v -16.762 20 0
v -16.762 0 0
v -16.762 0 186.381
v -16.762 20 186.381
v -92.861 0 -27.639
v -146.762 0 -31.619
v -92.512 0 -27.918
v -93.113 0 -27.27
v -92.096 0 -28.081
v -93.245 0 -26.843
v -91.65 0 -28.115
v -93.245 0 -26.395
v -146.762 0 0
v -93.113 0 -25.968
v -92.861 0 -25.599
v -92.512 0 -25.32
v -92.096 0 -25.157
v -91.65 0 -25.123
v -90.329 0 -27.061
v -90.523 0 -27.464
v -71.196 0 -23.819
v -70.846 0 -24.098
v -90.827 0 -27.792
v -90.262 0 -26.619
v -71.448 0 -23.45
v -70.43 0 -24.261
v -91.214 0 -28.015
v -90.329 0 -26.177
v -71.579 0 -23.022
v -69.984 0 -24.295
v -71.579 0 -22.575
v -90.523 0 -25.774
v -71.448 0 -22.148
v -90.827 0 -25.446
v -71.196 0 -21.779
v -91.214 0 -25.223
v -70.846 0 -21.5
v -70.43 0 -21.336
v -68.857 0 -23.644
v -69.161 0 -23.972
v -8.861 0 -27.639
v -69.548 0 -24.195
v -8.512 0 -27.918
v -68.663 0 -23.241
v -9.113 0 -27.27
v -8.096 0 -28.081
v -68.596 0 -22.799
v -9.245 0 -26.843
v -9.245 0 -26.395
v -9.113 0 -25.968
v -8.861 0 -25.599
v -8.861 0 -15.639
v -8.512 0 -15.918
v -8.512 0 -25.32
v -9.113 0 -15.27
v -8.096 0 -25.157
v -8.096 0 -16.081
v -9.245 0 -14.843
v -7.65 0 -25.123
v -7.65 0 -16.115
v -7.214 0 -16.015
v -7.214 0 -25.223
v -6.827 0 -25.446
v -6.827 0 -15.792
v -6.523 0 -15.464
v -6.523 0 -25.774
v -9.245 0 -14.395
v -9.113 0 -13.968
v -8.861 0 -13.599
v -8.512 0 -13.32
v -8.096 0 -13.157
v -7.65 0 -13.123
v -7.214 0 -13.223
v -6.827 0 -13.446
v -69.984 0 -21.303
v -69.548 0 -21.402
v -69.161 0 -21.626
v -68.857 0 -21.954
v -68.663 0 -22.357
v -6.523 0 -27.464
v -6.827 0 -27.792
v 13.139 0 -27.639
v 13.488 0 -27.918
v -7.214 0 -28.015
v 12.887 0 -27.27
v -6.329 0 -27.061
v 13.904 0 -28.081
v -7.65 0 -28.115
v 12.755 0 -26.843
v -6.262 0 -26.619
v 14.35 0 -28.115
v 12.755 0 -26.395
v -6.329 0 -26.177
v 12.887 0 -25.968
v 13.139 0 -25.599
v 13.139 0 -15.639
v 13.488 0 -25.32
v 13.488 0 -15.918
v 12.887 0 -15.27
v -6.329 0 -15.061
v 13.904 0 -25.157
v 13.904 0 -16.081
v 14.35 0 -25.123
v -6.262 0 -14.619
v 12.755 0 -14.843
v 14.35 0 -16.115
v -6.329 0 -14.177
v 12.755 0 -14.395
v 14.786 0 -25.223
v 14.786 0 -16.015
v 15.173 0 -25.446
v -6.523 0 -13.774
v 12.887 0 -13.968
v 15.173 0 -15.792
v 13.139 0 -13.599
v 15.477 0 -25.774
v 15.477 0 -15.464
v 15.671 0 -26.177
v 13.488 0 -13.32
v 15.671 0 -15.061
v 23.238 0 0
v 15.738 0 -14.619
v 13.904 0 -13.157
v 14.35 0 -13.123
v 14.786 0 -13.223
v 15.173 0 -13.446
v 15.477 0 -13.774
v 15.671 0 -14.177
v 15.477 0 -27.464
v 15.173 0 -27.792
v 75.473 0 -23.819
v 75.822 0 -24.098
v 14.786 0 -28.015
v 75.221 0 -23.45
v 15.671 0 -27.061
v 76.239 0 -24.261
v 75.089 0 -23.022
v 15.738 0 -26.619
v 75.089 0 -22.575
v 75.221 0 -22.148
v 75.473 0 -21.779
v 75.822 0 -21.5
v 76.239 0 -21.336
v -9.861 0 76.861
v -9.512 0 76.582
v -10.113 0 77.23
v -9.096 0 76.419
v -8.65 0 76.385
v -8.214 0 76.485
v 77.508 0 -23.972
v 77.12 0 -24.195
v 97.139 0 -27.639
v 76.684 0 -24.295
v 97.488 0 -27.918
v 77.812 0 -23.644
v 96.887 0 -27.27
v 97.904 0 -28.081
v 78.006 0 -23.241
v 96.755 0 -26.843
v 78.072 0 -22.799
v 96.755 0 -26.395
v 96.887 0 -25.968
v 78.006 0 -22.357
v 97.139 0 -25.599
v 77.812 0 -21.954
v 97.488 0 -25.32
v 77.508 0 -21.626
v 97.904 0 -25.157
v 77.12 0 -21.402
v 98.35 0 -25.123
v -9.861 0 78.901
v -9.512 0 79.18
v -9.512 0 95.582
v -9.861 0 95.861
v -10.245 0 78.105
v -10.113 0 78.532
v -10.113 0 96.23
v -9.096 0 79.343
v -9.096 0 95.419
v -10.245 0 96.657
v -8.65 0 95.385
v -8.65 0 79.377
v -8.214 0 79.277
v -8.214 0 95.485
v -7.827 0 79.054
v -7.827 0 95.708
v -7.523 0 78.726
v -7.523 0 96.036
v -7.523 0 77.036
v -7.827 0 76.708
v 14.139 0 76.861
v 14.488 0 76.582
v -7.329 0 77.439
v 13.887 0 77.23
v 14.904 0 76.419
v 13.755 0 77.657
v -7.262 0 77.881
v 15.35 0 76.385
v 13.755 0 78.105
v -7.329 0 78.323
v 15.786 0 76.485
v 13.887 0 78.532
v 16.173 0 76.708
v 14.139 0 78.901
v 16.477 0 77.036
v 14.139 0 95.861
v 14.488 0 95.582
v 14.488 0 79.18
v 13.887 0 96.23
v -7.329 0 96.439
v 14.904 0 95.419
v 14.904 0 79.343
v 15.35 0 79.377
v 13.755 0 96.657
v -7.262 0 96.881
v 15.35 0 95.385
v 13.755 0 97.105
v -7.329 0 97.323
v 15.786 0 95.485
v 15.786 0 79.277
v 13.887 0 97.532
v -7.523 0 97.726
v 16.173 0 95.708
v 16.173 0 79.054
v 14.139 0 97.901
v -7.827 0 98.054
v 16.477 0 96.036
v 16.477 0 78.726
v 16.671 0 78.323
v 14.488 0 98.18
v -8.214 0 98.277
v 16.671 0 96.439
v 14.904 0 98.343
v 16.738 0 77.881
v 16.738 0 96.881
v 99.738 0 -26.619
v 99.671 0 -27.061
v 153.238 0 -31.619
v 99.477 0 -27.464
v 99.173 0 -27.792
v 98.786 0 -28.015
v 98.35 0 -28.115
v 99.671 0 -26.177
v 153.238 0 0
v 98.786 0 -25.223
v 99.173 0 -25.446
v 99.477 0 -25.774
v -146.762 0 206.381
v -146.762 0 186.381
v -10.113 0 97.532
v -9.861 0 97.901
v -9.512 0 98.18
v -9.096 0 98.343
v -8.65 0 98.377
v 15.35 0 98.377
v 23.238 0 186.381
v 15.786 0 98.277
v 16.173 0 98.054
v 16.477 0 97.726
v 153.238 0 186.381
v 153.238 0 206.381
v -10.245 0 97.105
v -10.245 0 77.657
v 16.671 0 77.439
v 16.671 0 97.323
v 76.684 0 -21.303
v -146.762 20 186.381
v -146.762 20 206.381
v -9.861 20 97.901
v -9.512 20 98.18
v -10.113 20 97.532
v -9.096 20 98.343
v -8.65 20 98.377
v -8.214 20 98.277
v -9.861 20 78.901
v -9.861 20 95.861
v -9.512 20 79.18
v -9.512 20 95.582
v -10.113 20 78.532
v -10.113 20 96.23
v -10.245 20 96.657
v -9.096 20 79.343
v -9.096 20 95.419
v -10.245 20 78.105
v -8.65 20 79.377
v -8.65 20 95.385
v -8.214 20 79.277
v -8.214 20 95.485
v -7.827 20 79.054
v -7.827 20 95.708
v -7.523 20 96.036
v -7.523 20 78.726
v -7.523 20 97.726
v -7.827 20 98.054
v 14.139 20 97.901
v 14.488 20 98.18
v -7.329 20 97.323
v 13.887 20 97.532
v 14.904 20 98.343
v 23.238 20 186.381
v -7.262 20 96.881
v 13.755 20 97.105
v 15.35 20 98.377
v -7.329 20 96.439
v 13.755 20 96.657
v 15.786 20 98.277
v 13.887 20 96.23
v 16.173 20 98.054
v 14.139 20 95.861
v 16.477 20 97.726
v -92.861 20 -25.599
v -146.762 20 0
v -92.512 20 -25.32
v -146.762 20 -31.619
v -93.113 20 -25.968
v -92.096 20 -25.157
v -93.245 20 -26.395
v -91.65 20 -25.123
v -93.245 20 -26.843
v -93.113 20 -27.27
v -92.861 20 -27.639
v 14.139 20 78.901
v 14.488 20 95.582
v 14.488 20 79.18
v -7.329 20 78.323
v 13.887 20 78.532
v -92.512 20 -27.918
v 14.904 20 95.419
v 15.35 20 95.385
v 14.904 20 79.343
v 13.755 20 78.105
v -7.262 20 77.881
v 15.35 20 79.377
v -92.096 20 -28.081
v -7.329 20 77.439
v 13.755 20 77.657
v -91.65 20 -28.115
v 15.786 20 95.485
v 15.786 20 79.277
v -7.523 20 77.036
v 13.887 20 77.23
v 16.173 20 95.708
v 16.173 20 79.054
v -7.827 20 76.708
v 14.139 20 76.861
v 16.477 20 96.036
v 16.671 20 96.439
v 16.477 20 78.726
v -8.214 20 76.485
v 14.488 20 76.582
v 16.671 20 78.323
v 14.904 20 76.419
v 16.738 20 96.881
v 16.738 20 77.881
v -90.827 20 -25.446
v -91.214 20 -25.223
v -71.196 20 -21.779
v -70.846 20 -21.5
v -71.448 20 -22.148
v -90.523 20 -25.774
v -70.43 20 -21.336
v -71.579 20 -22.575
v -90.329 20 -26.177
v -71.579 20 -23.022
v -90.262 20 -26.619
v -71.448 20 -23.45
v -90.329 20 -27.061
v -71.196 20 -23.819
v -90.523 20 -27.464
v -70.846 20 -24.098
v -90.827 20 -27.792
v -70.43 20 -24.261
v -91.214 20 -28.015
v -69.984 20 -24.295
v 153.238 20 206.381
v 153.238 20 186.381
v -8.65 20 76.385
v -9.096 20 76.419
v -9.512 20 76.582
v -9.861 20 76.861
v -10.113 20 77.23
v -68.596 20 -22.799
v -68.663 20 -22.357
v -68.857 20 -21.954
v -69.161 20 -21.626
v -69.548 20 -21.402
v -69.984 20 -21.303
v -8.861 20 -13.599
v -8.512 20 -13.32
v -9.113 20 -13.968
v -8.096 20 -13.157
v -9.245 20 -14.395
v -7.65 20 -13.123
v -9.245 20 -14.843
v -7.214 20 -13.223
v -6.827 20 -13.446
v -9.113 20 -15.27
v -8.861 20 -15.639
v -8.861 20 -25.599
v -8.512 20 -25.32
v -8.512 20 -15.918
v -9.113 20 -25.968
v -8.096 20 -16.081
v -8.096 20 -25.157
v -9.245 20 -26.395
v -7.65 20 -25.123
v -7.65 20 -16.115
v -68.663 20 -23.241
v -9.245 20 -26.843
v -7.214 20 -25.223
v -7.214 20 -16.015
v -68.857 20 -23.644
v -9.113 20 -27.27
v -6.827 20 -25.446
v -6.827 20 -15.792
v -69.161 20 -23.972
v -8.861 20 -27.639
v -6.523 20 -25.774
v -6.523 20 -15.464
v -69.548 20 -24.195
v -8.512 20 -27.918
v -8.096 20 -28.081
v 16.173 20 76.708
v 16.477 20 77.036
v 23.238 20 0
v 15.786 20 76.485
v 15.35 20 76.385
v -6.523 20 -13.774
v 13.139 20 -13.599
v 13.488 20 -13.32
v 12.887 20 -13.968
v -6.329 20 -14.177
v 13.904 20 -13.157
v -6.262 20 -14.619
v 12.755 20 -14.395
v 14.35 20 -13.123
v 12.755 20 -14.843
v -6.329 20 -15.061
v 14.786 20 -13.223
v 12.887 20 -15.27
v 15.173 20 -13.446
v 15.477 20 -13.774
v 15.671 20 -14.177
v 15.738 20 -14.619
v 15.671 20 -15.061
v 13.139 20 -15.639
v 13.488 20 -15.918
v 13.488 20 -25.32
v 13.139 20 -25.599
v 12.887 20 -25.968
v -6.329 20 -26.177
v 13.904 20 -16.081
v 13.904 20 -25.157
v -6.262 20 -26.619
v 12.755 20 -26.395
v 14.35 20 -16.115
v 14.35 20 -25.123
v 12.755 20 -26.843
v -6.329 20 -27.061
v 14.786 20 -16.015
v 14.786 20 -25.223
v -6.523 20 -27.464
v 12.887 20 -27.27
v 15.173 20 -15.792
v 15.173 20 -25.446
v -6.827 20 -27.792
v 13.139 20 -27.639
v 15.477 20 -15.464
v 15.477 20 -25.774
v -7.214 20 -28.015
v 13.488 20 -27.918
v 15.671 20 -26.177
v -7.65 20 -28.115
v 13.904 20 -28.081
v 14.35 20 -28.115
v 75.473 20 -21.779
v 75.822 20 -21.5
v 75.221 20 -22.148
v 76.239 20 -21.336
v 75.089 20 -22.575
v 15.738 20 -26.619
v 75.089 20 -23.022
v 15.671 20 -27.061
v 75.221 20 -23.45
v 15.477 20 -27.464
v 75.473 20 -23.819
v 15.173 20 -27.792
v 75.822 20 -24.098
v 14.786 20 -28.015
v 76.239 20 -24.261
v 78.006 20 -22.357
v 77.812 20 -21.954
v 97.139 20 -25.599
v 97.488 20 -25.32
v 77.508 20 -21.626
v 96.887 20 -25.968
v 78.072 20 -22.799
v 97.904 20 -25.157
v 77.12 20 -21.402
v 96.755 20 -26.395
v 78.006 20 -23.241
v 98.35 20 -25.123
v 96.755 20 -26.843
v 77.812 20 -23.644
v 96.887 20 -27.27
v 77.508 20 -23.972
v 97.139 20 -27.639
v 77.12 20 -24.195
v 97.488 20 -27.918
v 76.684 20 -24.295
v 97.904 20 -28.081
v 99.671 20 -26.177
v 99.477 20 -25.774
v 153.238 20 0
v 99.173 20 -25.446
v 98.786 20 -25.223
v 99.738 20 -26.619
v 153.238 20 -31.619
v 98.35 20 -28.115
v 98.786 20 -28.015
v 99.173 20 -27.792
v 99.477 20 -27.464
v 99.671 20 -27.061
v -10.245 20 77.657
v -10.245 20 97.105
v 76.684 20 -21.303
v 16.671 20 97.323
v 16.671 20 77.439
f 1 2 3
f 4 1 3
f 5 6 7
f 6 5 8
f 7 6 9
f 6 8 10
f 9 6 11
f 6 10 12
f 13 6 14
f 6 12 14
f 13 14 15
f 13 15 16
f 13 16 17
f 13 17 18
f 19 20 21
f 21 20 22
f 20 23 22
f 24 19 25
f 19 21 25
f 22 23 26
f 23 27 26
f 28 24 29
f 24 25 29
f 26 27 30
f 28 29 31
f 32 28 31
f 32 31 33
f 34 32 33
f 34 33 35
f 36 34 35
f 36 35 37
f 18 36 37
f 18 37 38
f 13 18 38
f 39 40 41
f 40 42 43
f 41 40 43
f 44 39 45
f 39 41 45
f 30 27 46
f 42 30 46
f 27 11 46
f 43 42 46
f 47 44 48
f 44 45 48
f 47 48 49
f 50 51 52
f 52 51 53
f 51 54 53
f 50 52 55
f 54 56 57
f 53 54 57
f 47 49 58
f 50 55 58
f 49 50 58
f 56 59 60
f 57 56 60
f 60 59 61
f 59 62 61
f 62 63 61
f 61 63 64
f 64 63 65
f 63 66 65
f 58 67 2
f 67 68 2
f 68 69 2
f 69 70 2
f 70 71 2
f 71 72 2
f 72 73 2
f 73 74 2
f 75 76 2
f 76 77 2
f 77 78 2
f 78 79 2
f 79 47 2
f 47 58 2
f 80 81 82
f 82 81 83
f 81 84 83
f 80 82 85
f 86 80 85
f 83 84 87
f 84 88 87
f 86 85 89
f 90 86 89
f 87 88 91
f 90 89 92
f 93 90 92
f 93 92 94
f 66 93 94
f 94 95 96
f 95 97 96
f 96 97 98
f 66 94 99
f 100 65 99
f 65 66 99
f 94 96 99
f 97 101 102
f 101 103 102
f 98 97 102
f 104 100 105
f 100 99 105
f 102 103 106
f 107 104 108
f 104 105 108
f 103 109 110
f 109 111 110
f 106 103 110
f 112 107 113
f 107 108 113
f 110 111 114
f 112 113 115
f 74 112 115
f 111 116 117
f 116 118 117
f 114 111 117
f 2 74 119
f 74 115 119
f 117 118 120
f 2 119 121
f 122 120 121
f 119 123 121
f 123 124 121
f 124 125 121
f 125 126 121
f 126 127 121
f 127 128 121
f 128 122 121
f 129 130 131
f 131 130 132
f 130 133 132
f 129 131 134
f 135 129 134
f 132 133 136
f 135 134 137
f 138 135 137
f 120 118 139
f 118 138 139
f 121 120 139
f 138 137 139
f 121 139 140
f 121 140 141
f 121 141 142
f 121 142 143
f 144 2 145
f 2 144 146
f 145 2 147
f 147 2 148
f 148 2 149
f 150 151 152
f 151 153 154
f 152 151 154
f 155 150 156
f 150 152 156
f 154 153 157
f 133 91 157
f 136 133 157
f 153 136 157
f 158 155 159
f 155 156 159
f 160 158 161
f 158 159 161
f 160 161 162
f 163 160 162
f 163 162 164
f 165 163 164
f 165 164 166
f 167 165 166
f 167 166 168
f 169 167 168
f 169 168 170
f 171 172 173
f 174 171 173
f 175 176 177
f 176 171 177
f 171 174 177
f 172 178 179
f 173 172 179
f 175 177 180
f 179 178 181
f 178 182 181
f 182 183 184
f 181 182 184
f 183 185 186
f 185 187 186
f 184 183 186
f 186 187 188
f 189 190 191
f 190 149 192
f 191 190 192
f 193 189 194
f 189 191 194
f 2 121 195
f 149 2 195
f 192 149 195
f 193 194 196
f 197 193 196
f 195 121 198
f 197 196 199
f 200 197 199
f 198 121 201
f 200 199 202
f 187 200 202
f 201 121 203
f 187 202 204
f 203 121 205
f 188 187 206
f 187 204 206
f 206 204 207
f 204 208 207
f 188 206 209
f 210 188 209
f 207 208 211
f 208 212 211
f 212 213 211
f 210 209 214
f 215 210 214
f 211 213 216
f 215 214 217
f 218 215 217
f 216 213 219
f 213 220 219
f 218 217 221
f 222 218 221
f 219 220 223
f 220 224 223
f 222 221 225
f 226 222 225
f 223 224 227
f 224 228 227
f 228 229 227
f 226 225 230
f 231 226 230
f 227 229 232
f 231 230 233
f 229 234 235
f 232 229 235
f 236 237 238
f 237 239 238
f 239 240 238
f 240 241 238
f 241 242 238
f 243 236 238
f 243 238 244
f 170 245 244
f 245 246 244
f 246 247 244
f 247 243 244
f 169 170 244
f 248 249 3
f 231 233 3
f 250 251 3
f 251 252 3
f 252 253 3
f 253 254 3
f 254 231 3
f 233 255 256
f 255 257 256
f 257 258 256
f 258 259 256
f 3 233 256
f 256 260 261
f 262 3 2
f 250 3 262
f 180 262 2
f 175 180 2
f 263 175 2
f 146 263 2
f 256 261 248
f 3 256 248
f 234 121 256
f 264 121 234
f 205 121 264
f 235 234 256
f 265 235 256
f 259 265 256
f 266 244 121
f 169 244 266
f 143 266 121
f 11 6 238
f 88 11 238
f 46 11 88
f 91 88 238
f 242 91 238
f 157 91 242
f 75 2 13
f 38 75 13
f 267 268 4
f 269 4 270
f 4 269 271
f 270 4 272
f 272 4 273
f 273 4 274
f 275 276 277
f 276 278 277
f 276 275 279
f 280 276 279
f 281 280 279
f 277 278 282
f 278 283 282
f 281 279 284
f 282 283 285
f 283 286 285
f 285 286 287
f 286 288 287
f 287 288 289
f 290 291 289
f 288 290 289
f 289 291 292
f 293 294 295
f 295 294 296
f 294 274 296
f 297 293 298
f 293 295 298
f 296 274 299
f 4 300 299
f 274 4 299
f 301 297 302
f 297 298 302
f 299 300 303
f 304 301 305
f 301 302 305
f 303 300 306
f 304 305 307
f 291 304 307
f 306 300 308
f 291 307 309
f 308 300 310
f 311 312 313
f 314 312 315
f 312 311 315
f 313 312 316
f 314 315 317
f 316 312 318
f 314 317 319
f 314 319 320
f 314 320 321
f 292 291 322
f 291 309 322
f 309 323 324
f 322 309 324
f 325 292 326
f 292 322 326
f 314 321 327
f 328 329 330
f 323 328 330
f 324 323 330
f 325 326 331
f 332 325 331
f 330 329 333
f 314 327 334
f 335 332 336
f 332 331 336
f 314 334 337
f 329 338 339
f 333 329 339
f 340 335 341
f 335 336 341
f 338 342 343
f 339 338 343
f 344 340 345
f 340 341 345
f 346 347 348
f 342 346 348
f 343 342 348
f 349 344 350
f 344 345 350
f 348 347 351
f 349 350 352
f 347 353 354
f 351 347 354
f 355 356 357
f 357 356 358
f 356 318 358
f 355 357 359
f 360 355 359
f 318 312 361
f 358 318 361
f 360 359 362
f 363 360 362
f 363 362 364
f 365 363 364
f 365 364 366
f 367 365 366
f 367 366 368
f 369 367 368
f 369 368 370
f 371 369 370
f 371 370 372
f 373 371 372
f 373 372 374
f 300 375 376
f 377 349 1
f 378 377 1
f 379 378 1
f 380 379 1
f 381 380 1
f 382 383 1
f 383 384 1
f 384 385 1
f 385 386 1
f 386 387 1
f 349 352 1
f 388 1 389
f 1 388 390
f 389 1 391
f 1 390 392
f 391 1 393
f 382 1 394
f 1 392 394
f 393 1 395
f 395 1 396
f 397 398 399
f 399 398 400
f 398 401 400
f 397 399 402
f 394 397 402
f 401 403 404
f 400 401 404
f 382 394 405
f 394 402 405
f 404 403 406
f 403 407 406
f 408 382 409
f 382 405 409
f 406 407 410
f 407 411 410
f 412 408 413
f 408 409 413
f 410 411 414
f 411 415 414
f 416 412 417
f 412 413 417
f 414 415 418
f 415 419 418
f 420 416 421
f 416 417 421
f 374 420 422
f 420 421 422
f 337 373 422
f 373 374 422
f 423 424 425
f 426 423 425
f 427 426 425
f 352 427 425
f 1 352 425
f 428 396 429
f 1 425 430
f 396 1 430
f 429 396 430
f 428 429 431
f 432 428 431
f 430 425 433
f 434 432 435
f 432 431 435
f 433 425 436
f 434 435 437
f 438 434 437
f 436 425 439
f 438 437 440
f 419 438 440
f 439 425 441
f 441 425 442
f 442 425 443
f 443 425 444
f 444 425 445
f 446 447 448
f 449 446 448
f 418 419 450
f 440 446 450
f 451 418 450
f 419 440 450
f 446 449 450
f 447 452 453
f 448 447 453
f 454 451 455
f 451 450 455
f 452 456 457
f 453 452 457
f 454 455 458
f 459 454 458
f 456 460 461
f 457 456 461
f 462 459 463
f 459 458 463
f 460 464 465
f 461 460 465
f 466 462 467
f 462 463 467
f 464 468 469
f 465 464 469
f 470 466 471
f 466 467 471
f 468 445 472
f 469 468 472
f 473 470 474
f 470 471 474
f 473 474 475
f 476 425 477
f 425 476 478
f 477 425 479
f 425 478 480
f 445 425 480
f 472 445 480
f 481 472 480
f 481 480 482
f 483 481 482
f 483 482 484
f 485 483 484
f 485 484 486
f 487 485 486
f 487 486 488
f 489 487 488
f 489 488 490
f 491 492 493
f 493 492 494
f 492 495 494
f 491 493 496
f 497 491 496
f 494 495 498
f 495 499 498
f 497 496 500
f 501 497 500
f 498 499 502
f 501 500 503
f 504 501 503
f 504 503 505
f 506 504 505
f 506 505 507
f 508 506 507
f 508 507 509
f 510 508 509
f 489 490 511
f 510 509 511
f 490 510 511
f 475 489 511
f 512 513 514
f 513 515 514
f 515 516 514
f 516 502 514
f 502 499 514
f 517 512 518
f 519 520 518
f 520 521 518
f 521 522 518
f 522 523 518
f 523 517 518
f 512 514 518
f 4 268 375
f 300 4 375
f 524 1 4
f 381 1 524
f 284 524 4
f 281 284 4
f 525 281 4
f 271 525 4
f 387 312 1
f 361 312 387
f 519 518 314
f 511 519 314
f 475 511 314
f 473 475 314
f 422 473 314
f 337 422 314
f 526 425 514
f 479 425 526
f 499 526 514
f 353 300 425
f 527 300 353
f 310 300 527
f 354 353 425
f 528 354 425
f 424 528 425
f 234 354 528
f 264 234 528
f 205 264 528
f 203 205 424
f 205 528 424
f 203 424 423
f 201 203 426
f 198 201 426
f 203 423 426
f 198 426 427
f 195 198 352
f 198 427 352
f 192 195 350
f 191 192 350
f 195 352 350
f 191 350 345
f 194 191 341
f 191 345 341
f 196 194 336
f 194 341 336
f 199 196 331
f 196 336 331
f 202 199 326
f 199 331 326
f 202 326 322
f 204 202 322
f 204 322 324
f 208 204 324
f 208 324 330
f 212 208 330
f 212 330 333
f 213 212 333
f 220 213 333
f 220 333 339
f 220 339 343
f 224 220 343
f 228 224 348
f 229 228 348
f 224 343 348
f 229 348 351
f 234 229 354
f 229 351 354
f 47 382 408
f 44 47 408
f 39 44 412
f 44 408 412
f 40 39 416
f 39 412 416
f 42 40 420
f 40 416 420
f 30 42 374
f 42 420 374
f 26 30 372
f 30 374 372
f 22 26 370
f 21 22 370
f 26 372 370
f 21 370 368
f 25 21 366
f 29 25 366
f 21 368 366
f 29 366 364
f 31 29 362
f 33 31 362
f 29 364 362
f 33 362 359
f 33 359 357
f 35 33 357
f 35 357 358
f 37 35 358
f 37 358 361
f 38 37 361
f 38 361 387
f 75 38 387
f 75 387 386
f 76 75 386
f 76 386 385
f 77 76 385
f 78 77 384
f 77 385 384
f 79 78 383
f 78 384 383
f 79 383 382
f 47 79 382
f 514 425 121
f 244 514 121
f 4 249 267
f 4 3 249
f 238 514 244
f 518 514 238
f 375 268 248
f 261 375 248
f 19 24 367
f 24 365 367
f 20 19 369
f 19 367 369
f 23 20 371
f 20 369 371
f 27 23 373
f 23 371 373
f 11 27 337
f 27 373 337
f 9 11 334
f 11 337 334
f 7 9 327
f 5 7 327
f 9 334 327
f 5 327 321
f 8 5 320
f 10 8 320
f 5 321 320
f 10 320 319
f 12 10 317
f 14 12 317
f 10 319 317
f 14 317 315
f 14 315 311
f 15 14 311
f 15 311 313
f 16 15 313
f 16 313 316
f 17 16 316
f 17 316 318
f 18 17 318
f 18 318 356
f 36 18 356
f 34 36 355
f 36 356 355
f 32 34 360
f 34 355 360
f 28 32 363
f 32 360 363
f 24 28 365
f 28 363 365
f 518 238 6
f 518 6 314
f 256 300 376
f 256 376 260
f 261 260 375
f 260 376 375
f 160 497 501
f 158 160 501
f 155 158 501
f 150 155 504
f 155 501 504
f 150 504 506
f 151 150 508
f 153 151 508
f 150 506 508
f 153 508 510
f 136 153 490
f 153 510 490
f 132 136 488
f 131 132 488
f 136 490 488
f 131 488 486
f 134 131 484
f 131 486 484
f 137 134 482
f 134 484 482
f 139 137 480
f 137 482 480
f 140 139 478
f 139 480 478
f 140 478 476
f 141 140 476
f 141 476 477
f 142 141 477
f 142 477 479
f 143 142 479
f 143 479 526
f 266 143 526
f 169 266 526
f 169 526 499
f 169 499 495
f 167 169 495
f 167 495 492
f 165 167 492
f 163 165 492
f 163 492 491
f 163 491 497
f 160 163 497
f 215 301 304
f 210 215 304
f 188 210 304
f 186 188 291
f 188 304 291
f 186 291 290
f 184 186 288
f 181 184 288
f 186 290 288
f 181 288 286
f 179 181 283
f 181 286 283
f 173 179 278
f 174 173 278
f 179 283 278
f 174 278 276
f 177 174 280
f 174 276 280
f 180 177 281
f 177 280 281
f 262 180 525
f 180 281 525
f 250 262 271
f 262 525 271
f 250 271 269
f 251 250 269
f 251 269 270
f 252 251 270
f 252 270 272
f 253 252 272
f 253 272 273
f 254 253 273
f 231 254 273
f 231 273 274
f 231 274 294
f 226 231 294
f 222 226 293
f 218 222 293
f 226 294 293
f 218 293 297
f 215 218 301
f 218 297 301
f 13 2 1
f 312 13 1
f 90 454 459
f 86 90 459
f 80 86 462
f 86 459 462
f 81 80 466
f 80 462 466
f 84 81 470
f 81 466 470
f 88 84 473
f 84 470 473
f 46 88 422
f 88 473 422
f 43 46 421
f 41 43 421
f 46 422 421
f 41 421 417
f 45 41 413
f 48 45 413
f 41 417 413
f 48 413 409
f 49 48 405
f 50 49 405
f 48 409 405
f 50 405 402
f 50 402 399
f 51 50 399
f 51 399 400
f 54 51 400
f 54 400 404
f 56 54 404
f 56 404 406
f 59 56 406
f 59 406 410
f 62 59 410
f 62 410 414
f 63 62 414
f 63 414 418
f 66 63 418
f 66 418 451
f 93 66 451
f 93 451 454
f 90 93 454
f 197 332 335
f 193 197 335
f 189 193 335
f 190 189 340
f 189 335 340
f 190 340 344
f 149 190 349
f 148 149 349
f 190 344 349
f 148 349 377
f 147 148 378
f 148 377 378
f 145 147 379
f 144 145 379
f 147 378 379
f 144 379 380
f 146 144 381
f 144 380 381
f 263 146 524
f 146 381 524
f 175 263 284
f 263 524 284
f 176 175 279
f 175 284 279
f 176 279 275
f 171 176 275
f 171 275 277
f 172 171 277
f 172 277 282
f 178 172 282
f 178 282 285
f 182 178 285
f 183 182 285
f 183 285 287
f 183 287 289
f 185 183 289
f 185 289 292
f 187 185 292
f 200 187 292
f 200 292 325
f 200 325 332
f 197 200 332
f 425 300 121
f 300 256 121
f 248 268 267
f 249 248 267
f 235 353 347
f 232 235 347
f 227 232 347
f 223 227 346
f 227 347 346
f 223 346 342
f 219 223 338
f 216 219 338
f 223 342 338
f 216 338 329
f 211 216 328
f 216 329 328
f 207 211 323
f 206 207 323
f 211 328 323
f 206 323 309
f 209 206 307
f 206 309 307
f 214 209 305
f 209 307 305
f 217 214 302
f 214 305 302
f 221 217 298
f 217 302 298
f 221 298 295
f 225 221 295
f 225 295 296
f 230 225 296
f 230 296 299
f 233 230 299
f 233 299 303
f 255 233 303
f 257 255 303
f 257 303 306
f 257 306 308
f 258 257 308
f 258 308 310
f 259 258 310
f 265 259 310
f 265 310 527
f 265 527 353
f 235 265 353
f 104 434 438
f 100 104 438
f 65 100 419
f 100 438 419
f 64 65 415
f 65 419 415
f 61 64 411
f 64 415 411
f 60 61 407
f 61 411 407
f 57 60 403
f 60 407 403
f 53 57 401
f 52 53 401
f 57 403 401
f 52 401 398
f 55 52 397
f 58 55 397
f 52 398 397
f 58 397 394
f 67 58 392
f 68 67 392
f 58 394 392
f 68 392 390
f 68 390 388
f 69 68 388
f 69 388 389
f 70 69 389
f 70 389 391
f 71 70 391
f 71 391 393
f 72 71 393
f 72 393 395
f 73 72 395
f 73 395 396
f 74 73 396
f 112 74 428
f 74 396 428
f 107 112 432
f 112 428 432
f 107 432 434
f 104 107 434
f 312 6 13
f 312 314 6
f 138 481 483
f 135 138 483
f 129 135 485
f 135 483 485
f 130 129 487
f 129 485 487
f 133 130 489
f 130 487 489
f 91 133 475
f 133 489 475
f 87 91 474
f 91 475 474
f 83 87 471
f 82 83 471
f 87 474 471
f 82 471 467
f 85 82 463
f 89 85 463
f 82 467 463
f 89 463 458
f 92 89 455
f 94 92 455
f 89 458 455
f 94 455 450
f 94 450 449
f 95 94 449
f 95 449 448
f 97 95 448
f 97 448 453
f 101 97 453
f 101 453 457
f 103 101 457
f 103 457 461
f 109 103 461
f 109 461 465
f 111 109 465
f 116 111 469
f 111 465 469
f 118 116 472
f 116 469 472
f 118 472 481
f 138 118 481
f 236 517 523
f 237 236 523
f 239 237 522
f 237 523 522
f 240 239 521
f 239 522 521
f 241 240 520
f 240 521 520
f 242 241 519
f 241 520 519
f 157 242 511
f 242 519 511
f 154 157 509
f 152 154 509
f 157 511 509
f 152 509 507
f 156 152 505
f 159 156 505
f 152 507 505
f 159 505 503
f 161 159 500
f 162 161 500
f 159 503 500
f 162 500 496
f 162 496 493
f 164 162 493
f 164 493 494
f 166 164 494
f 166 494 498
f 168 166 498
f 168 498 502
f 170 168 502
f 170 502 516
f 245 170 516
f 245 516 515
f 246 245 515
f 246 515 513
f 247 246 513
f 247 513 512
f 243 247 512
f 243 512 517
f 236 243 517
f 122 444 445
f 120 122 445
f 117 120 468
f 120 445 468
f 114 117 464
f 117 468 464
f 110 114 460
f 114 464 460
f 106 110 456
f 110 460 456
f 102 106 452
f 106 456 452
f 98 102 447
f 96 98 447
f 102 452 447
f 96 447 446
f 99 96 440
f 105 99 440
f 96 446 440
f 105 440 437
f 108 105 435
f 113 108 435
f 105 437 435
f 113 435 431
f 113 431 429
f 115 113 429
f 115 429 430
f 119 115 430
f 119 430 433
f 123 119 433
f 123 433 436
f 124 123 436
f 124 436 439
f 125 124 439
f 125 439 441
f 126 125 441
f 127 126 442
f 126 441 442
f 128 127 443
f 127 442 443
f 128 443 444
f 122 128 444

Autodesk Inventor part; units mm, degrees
ref_plane "YZ Plane" through (0, 0, 0) normal (1, 0, 0) x (0, 1, 0)
ref_plane "XZ Plane" through (0, 0, 0) normal (0, 1, 0) x (-1, 0, 0)
ref_plane "XY Plane" through (0, 0, 0) normal (0, 0, 1) x (1, 0, 0)
sketch "草图1" plane through (0, 0, 0) normal (0, 1, 0) x (-1, 0, 0)
  line L0 (16.7619, 206.381) -> (-23.2381, 206.381)
  line L1 (-23.2381, 206.381) -> (-23.2381, -31.619)
  line L2 (-23.2381, -31.619) -> (16.7619, -31.619)
  line L3 (16.7619, -31.619) -> (16.7619, 206.381)
  point P0 (0, 0)
  dimension "d0" = 40
  dimension "d1" = 238
extrude "拉伸1" add sketch "草图1" along normal blind 20
sketch "草图2" plane through (23.2381, 0, 206.381) normal (1, 0, 0) x (0, 0, -1)
  line L0 (238, 20) -> (0, 20) projected
  line L1 (238, 0) -> (0, 0) projected
  line L2 (0, 20) -> (20, 20)
  line L3 (20, 20) -> (20, 0)
  line L4 (20, 0) -> (0, 0)
  line L5 (0, 0) -> (0, 20)
  point P0 (206.381, 0)
  dimension "d4" = 20
extrude "拉伸2" add sketch "草图2" along normal blind 20
sketch "草图5" plane through (-16.7619, 0, -31.619) normal (-1, 0, 0) x (0, 0, 1)
  line L0 (0, 0) -> (238, 0) projected
  line L1 (218, 20) -> (0, 20) projected
  line L2 (238, 0) -> (218, 0)
  line L3 (218, 0) -> (218, 20)
  line L4 (218, 20) -> (238, 20)
  line L5 (238, 20) -> (238, 0)
  point P0 (31.619, 0)
extrude "拉伸3" add sketch "草图5" along normal blind 20
sketch "草图6" plane through (-16.7619, 0, -31.619) normal (-1, 0, 0) x (0, 0, 1)
  line L0 (0, 0) -> (0, 20) projected
  line L1 (218, 0) -> (0, 0) projected
  line L2 (0, 20) -> (20, 20)
  line L3 (20, 20) -> (20, 0)
  line L4 (20, 0) -> (0, 0)
  line L5 (0, 0) -> (0, 20)
  point P0 (31.619, 0)
  dimension "d9" = 20
extrude "拉伸4" add sketch "草图6" along normal blind 20
sketch "草图7" plane through (23.2381, 0, -31.619) normal (1, 0, 0) x (0, 0, -1)
  line L0 (0, 0) -> (0, 20) projected
  line L1 (-20, 0) -> (-218, 0) projected
  line L2 (0, 20) -> (-20, 20)
  line L3 (-20, 20) -> (-20, 0)
  line L4 (-20, 0) -> (0, 0)
  line L5 (0, 0) -> (0, 20)
  point P0 (-31.619, 0)
extrude "拉伸5" add sketch "草图7" along normal blind 20
sketch "草图8" plane through (0, 20, 0) normal (0, 1, 0) x (1, 0, 0)
  line L0 (23.2381, -186.381) -> (23.2381, 11.619) projected
  line L1 (-16.7619, 11.619) -> (-16.7619, -186.381) projected
  circle A0 centre (-8.7619, -96.881) radius 1.5
  circle A1 centre (-8.7619, -77.881) radius 1.5
  circle A2 centre (15.2381, -96.881) radius 1.5
  circle A3 centre (15.2381, -77.881) radius 1.5
  point P0 (0, 0)
extrude "拉伸6" cut sketch "草图8" against normal through all
sketch "草图9" plane through (0, 20, 0) normal (0, 1, 0) x (1, 0, 0)
  line L0 (-36.7619, 31.619) -> (43.2381, 31.619) projected
  line L1 (3.2381, 31.619) -> (3.2381, -247.5925)
  line L2 (3.2381, 31.619) -> (153.2381, 31.619)
  line L3 (3.2381, 31.619) -> (-146.7619, 31.619)
  line L4 (-146.7619, 31.619) -> (-146.7619, 11.619)
  line L5 (-16.7619, 11.619) -> (-36.7619, 11.619) projected
  line L6 (-146.7619, 11.619) -> (153.2381, 11.619)
  line L7 (153.2381, 11.619) -> (153.2381, 31.619)
  line L8 (-146.7619, -186.381) -> (153.2381, -186.381)
  line L9 (153.2381, -186.381) -> (153.2381, -206.381)
  line L10 (43.2381, -206.381) -> (-36.7619, -206.381) projected
  line L11 (153.2381, -206.381) -> (-146.7619, -206.381)
  line L12 (-146.7619, -206.381) -> (-146.7619, -186.381)
  point P0 (0, 0)
  dimension "d20" = 150
  dimension "d21" = 150
extrude "拉伸7" add sketch "草图9" against normal blind 20
sketch "草图10" plane through (0, 20, 0) normal (0, 1, 0) x (1, 0, 0)
  line L0 (3.2381, 42.6) -> (3.2381, -82.4296)
  line L1 (-146.7619, 31.619) -> (153.2381, 31.619) projected
  line L2 (3.2381, 31.619) -> (3.2381, 26.619)
  line L3 (3.2381, 26.619) -> (14.2381, 26.619)
  line L4 (14.2381, 26.619) -> (-7.7619, 26.619)
  circle A0 centre (-7.7619, 26.619) radius 1.5
  circle A1 centre (14.2381, 26.619) radius 1.5
  line L5 (14.2381, 26.619) -> (14.2381, 14.619)
  circle A2 centre (14.2381, 14.619) radius 1.5
  line L6 (-7.7619, 26.619) -> (-7.7619, 14.619)
  circle A3 centre (-7.7619, 14.619) radius 1.5
  point P0 (0, 0)
  dimension "d27" = 5
  dimension "d28" = 11
  dimension "d29" = 22
  dimension "d30" = 3
  dimension "d31" = 3
  dimension "d32" = 12
  dimension "d33" = 3
  dimension "d34" = 12
  dimension "d35" = 3
extrude "拉伸8" cut sketch "草图10" against normal through all
sketch "草图12" plane through (0, 20, 0) normal (0, 1, 0) x (1, 0, 0)
  line L0 (-146.7619, 31.619) -> (-91.7619, 31.619)
  line L1 (-91.7619, 31.619) -> (-91.7619, 26.619)
  circle A0 centre (-91.7619, 26.619) radius 1.5
  line L2 (3.2381, 31.619) -> (3.2381, -27.4763)
  line L3 (98.2381, 31.619) -> (98.2381, 26.619)
  circle A1 centre (98.2381, 26.619) radius 1.5
  line L4 (-91.7619, 26.619) -> (-70.0961, 22.7988)
  circle A2 centre (14.2381, 26.619) radius 1.5 projected
  circle A3 centre (-7.7619, 26.619) radius 1.5 projected
  circle A4 centre (-70.0961, 22.7988) radius 1.5
  circle A5 centre (76.5723, 22.7988) radius 1.5
  point P0 (0, 0)
  dimension "d43" = 55
  dimension "d50" = 22
  dimension "d51" = 3
  dimension "d58" = 100
  dimension "d59" = 5
extrude "拉伸9" cut sketch "草图12" against normal through all contours A0 L4 L1 | A4 | L1 L4 A0 | A1 | A5
sketch "草图13" plane through (23.2381, 0, 186.381) normal (1, 0, 0) x (0, 0, -1)
  line L0 (0, 20) -> (198, 20) projected
  line L1 (198, 20) -> (186.381, 20)
  line L2 (186.381, 20) -> (186.381, 0)
  line L3 (186.381, 0) -> (198, 0)
  line L4 (198, 0) -> (198, 20)
extrude "拉伸10" add sketch "草图13" along normal blind 130 and the other way blind 5
sketch "草图14" plane through (-16.7619, 0, 186.381) normal (-1, 0, 0) x (0, 0, 1)
  line L0 (-198, 20) -> (-198, 0) projected
  line L1 (-186.381, 0) -> (-186.381, 20) projected
  line L2 (-198, 0) -> (-186.381, 0)
  line L3 (-186.381, 0) -> (-186.381, 20)
  line L4 (-186.381, 20) -> (-198, 20)
  line L5 (-198, 20) -> (-198, 0)
  point P0 (-197.5, 20)
extrude "拉伸11" add sketch "草图14" along normal blind 130
equation "\"折弯半径\" = 厚度"
equation "\"折弯释压宽度\" = 厚度"
equation "\"折弯释压深度\" = 0.5 * 厚度"
equation "\"拐角释压尺寸\" = 4 * 厚度"
equation "\"最小余量\" = 2 * 厚度"
equation "\"过渡半径\" = 折弯半径"
equation "\"Jacobi半径尺寸\" = 折弯半径"
equation "\"间隙大小\" = 厚度"
equation "\"厚度\" = 0.5"
properties part number "固定架"
